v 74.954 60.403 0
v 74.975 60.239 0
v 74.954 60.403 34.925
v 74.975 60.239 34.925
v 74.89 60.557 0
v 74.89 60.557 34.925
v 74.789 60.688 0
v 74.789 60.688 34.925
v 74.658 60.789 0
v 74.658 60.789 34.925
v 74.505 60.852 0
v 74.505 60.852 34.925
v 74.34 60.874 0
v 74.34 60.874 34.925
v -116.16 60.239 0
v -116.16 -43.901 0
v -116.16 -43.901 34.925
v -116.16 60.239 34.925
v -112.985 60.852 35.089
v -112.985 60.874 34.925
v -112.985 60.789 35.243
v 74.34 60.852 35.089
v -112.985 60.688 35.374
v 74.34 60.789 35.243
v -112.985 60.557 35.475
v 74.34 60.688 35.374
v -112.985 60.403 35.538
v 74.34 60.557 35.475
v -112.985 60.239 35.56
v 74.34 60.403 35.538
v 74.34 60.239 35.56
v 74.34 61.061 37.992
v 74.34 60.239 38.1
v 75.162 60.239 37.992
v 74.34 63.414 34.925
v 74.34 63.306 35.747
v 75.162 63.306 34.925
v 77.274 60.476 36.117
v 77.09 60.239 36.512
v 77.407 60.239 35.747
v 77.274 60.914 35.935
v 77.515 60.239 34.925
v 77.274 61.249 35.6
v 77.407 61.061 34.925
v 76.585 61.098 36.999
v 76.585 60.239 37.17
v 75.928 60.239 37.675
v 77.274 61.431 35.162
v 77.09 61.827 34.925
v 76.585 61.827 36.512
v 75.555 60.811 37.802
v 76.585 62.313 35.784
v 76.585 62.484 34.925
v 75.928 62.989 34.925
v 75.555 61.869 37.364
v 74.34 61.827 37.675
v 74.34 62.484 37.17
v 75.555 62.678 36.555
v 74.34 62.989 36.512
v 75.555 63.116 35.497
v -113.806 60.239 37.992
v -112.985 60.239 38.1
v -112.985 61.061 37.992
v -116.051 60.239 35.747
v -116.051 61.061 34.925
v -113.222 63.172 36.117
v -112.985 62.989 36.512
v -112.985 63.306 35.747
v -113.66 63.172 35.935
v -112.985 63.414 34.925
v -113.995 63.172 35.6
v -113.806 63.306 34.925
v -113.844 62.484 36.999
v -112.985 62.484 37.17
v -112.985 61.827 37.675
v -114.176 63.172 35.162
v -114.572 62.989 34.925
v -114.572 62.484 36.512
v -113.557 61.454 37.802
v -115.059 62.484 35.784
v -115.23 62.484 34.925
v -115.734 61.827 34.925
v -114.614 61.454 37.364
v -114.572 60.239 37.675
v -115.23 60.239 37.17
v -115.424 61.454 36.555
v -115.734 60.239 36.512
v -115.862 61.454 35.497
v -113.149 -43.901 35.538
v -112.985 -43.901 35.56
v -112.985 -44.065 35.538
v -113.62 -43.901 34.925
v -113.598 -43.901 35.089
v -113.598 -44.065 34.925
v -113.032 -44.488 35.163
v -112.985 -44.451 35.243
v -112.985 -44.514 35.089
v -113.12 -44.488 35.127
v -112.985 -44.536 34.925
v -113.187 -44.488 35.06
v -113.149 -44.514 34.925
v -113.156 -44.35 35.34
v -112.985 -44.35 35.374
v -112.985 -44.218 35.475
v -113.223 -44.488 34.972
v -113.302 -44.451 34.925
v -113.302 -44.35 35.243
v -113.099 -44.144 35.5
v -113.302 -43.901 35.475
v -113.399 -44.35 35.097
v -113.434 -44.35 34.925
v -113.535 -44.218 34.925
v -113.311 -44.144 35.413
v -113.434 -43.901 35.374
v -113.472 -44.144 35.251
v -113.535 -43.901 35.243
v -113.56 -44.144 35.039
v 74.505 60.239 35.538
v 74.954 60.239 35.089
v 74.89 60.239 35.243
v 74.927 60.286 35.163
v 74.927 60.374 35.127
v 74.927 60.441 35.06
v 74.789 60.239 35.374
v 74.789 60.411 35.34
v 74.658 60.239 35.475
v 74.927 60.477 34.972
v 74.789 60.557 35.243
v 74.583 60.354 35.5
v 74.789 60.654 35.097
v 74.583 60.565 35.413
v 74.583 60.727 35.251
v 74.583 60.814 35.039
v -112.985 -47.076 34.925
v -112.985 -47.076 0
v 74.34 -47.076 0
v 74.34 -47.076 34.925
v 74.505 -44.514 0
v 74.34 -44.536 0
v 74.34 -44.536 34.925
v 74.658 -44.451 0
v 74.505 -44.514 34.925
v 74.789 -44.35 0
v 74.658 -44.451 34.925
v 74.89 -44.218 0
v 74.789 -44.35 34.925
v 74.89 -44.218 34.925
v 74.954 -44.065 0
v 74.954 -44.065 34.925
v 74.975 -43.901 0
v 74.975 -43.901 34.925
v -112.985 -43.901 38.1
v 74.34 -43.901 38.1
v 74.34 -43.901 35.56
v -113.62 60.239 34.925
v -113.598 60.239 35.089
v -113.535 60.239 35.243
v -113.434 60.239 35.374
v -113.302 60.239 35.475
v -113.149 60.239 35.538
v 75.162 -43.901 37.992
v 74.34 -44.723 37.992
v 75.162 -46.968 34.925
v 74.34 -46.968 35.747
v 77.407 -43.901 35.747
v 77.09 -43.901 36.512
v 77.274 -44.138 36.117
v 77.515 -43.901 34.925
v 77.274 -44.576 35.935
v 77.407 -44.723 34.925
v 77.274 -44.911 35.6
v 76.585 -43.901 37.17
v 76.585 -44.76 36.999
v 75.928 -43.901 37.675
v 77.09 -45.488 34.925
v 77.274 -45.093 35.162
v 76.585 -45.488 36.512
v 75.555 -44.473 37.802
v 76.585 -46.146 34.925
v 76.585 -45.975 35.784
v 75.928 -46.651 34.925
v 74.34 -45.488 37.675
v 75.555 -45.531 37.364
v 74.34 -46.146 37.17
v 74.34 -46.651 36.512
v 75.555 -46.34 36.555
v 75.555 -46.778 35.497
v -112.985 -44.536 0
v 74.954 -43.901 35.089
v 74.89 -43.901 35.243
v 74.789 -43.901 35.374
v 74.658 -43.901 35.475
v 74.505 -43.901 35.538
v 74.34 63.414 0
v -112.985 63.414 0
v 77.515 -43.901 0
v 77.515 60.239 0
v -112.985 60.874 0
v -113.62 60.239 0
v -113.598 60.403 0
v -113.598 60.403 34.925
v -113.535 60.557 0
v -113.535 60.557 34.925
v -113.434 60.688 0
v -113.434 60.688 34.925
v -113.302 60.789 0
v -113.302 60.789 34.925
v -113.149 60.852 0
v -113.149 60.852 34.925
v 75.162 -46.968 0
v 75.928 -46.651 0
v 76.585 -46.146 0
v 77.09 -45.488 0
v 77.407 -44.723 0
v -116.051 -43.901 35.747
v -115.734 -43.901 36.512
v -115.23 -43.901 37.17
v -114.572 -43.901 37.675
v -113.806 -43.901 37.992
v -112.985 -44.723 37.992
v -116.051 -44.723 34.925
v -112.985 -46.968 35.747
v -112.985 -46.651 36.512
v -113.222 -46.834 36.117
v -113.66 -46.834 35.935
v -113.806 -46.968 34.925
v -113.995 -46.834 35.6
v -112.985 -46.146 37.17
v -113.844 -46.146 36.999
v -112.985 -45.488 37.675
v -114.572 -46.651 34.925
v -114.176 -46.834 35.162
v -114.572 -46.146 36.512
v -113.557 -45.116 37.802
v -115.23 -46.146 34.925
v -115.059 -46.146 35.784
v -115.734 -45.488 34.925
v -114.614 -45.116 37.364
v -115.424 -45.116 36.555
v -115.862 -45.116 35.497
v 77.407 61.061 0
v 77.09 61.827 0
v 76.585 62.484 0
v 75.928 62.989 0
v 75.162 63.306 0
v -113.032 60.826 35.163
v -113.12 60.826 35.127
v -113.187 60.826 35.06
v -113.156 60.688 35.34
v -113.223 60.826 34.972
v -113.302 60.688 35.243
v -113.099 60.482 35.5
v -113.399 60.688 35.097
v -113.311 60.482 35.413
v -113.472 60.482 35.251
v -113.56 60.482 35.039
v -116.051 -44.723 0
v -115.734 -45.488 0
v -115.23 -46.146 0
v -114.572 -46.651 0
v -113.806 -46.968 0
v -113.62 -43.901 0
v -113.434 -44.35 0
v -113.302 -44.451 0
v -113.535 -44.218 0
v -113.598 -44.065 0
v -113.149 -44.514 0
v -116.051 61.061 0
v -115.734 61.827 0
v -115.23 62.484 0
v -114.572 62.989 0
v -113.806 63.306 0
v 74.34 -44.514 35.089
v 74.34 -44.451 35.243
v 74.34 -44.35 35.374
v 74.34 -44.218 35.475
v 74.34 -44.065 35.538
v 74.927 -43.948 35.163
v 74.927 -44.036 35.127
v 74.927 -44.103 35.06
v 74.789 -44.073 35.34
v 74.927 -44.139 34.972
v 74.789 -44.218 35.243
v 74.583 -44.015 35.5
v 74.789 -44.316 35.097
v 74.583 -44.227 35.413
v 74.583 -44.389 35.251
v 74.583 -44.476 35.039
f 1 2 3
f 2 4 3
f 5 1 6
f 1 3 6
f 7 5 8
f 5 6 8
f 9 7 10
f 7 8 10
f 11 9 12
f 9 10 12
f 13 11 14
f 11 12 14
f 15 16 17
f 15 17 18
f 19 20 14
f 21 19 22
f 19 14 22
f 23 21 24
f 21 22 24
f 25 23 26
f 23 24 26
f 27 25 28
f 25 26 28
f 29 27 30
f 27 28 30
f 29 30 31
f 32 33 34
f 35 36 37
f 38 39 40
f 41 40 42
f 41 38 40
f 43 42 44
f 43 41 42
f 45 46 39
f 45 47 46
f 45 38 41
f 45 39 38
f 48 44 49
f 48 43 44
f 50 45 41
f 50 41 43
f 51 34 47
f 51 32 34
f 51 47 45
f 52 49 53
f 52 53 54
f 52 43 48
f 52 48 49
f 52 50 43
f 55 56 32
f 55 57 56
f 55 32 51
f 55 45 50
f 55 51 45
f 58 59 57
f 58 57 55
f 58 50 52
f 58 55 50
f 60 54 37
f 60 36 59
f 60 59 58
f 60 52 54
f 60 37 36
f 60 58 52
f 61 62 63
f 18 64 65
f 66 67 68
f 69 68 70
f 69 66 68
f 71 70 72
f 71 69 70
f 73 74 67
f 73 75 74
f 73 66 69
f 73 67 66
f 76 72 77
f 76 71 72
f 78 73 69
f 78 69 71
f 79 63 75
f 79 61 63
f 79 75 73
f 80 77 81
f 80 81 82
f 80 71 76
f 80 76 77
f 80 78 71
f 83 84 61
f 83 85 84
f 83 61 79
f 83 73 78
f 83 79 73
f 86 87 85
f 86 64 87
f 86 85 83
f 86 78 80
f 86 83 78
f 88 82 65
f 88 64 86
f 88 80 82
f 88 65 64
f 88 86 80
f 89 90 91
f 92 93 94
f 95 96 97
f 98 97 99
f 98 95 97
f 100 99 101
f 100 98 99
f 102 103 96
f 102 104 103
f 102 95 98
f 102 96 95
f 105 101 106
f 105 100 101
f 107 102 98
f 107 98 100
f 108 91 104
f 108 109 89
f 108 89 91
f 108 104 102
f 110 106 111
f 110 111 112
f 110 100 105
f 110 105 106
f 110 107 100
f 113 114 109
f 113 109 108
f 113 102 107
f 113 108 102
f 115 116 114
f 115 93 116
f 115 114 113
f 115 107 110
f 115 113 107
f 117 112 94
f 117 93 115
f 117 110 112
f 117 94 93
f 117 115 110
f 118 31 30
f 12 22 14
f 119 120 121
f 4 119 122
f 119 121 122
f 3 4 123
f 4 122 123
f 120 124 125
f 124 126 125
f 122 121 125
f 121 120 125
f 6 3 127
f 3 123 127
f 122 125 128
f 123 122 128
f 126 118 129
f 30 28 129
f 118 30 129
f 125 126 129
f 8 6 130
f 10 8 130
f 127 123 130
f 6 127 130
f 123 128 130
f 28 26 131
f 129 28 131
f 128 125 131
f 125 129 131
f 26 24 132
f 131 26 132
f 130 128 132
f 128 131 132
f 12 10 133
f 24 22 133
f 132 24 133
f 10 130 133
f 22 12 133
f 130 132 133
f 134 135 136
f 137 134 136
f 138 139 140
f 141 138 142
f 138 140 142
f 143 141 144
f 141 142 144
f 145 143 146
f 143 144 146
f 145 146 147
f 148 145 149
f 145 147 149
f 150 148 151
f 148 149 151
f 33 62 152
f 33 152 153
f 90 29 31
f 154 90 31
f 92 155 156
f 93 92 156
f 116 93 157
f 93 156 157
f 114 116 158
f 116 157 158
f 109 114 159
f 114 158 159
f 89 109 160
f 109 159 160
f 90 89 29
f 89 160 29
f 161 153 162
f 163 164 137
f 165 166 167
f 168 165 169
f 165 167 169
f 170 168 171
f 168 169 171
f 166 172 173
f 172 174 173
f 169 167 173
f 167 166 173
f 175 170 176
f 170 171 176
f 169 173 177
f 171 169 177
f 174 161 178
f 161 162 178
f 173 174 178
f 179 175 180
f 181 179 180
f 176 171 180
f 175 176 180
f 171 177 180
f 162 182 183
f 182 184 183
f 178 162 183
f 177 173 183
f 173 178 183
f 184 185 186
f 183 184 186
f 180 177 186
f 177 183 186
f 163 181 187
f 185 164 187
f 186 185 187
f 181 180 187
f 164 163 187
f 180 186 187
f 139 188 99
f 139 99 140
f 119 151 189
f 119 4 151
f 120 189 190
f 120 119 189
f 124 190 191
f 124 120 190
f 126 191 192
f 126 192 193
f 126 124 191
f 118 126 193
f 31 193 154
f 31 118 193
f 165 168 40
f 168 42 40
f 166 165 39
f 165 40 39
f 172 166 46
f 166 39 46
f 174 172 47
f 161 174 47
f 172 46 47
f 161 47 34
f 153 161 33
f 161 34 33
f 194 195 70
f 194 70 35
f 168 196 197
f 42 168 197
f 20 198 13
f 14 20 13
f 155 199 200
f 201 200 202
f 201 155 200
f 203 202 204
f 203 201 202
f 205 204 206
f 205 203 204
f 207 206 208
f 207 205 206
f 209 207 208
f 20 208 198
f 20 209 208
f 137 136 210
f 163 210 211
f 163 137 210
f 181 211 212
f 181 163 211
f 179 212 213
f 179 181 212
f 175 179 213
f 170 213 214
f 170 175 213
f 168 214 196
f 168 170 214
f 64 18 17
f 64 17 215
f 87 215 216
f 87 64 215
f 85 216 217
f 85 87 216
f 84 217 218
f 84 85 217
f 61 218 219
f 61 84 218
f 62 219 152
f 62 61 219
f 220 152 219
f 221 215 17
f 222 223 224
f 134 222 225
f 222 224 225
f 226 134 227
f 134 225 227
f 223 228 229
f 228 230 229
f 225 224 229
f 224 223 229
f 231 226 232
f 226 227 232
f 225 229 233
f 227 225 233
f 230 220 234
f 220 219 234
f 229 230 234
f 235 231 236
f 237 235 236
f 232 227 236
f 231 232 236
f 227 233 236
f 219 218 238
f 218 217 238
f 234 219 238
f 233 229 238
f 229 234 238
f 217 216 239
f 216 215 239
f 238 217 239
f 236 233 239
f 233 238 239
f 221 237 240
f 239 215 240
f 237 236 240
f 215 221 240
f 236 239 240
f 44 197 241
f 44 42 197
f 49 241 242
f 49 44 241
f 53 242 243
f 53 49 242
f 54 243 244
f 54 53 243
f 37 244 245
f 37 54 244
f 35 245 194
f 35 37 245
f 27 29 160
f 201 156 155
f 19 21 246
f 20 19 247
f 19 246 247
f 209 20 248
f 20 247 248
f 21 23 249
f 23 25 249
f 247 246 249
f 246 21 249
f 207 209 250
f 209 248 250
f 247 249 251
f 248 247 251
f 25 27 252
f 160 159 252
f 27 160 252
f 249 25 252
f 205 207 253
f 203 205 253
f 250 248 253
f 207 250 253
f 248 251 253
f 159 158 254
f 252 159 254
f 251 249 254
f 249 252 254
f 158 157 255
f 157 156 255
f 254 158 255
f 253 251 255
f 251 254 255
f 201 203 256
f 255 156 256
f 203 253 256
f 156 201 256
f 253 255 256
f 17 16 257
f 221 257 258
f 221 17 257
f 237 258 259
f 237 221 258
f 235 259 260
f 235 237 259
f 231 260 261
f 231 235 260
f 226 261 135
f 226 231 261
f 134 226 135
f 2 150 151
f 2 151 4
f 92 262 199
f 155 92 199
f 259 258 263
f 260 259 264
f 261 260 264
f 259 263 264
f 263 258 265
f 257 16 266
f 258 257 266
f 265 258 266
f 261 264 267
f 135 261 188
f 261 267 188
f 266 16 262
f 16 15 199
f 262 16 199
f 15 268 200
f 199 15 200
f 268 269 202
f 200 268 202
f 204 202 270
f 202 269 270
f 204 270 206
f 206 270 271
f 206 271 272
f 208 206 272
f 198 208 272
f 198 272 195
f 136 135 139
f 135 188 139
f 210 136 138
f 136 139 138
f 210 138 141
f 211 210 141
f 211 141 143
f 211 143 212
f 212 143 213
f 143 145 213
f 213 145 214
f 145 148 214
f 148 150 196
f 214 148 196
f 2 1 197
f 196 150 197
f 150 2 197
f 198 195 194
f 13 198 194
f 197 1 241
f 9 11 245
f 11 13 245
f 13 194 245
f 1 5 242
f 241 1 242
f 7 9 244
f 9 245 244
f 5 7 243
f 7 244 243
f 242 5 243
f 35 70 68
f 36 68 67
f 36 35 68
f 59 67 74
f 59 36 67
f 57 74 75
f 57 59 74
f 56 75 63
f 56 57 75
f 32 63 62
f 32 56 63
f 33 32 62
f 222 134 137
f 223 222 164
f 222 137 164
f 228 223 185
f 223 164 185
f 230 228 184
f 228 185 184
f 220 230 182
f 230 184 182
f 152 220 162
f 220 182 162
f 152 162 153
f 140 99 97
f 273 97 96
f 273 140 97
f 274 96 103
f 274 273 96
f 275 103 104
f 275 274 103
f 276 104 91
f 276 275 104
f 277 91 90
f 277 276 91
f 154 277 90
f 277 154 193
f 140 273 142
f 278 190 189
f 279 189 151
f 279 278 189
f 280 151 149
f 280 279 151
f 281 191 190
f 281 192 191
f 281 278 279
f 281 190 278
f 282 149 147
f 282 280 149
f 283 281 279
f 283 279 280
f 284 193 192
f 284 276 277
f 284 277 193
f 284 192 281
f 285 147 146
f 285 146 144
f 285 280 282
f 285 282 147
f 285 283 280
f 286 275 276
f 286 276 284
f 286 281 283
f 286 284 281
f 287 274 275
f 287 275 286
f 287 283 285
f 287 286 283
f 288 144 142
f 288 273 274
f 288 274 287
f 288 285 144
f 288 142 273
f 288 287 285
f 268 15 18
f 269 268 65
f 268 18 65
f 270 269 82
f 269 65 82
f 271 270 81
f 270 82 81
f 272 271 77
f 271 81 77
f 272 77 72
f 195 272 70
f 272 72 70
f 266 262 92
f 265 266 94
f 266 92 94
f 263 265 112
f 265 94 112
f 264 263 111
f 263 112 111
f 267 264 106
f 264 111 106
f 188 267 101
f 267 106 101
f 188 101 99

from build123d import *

# Parameters (mm, degrees)
F0_W     = 193.675
F0_H     = 110.49
F1_DEPTH = 38.1
F2_R     = 3.175
F3_T     = -2.54


with BuildPart() as f1:
    # F0 (on Top) → F1 (new body)
    with BuildSketch(Plane.XY):
        with Locations((-19.322108, 8.169052)):
            Rectangle(F0_W, F0_H)
    extrude(amount=F1_DEPTH)

    # F2
    f2_edges = [f1.edges().sort_by_distance(p)[0] for p in [
        (-116.159608, 8.169052, 38.1),
        (-19.322108, 63.414052, 38.1),
        (-19.322108, -47.075948, 38.1),
        (77.515392, 8.169052, 38.1),
        (77.515392, 63.414052, 19.05),
        (77.515392, -47.075948, 19.05),
        (-116.159608, -47.075948, 19.05),
        (-116.159608, 63.414052, 19.05),
    ]]
    fillet(f2_edges, radius=F2_R)

    # F3
    f3_openings = [f1.faces().sort_by_distance(p)[0] for p in [
        (-19.322108, 8.169052, 0),
    ]]
    offset(amount=F3_T, openings=f3_openings)


solid = f1.part
